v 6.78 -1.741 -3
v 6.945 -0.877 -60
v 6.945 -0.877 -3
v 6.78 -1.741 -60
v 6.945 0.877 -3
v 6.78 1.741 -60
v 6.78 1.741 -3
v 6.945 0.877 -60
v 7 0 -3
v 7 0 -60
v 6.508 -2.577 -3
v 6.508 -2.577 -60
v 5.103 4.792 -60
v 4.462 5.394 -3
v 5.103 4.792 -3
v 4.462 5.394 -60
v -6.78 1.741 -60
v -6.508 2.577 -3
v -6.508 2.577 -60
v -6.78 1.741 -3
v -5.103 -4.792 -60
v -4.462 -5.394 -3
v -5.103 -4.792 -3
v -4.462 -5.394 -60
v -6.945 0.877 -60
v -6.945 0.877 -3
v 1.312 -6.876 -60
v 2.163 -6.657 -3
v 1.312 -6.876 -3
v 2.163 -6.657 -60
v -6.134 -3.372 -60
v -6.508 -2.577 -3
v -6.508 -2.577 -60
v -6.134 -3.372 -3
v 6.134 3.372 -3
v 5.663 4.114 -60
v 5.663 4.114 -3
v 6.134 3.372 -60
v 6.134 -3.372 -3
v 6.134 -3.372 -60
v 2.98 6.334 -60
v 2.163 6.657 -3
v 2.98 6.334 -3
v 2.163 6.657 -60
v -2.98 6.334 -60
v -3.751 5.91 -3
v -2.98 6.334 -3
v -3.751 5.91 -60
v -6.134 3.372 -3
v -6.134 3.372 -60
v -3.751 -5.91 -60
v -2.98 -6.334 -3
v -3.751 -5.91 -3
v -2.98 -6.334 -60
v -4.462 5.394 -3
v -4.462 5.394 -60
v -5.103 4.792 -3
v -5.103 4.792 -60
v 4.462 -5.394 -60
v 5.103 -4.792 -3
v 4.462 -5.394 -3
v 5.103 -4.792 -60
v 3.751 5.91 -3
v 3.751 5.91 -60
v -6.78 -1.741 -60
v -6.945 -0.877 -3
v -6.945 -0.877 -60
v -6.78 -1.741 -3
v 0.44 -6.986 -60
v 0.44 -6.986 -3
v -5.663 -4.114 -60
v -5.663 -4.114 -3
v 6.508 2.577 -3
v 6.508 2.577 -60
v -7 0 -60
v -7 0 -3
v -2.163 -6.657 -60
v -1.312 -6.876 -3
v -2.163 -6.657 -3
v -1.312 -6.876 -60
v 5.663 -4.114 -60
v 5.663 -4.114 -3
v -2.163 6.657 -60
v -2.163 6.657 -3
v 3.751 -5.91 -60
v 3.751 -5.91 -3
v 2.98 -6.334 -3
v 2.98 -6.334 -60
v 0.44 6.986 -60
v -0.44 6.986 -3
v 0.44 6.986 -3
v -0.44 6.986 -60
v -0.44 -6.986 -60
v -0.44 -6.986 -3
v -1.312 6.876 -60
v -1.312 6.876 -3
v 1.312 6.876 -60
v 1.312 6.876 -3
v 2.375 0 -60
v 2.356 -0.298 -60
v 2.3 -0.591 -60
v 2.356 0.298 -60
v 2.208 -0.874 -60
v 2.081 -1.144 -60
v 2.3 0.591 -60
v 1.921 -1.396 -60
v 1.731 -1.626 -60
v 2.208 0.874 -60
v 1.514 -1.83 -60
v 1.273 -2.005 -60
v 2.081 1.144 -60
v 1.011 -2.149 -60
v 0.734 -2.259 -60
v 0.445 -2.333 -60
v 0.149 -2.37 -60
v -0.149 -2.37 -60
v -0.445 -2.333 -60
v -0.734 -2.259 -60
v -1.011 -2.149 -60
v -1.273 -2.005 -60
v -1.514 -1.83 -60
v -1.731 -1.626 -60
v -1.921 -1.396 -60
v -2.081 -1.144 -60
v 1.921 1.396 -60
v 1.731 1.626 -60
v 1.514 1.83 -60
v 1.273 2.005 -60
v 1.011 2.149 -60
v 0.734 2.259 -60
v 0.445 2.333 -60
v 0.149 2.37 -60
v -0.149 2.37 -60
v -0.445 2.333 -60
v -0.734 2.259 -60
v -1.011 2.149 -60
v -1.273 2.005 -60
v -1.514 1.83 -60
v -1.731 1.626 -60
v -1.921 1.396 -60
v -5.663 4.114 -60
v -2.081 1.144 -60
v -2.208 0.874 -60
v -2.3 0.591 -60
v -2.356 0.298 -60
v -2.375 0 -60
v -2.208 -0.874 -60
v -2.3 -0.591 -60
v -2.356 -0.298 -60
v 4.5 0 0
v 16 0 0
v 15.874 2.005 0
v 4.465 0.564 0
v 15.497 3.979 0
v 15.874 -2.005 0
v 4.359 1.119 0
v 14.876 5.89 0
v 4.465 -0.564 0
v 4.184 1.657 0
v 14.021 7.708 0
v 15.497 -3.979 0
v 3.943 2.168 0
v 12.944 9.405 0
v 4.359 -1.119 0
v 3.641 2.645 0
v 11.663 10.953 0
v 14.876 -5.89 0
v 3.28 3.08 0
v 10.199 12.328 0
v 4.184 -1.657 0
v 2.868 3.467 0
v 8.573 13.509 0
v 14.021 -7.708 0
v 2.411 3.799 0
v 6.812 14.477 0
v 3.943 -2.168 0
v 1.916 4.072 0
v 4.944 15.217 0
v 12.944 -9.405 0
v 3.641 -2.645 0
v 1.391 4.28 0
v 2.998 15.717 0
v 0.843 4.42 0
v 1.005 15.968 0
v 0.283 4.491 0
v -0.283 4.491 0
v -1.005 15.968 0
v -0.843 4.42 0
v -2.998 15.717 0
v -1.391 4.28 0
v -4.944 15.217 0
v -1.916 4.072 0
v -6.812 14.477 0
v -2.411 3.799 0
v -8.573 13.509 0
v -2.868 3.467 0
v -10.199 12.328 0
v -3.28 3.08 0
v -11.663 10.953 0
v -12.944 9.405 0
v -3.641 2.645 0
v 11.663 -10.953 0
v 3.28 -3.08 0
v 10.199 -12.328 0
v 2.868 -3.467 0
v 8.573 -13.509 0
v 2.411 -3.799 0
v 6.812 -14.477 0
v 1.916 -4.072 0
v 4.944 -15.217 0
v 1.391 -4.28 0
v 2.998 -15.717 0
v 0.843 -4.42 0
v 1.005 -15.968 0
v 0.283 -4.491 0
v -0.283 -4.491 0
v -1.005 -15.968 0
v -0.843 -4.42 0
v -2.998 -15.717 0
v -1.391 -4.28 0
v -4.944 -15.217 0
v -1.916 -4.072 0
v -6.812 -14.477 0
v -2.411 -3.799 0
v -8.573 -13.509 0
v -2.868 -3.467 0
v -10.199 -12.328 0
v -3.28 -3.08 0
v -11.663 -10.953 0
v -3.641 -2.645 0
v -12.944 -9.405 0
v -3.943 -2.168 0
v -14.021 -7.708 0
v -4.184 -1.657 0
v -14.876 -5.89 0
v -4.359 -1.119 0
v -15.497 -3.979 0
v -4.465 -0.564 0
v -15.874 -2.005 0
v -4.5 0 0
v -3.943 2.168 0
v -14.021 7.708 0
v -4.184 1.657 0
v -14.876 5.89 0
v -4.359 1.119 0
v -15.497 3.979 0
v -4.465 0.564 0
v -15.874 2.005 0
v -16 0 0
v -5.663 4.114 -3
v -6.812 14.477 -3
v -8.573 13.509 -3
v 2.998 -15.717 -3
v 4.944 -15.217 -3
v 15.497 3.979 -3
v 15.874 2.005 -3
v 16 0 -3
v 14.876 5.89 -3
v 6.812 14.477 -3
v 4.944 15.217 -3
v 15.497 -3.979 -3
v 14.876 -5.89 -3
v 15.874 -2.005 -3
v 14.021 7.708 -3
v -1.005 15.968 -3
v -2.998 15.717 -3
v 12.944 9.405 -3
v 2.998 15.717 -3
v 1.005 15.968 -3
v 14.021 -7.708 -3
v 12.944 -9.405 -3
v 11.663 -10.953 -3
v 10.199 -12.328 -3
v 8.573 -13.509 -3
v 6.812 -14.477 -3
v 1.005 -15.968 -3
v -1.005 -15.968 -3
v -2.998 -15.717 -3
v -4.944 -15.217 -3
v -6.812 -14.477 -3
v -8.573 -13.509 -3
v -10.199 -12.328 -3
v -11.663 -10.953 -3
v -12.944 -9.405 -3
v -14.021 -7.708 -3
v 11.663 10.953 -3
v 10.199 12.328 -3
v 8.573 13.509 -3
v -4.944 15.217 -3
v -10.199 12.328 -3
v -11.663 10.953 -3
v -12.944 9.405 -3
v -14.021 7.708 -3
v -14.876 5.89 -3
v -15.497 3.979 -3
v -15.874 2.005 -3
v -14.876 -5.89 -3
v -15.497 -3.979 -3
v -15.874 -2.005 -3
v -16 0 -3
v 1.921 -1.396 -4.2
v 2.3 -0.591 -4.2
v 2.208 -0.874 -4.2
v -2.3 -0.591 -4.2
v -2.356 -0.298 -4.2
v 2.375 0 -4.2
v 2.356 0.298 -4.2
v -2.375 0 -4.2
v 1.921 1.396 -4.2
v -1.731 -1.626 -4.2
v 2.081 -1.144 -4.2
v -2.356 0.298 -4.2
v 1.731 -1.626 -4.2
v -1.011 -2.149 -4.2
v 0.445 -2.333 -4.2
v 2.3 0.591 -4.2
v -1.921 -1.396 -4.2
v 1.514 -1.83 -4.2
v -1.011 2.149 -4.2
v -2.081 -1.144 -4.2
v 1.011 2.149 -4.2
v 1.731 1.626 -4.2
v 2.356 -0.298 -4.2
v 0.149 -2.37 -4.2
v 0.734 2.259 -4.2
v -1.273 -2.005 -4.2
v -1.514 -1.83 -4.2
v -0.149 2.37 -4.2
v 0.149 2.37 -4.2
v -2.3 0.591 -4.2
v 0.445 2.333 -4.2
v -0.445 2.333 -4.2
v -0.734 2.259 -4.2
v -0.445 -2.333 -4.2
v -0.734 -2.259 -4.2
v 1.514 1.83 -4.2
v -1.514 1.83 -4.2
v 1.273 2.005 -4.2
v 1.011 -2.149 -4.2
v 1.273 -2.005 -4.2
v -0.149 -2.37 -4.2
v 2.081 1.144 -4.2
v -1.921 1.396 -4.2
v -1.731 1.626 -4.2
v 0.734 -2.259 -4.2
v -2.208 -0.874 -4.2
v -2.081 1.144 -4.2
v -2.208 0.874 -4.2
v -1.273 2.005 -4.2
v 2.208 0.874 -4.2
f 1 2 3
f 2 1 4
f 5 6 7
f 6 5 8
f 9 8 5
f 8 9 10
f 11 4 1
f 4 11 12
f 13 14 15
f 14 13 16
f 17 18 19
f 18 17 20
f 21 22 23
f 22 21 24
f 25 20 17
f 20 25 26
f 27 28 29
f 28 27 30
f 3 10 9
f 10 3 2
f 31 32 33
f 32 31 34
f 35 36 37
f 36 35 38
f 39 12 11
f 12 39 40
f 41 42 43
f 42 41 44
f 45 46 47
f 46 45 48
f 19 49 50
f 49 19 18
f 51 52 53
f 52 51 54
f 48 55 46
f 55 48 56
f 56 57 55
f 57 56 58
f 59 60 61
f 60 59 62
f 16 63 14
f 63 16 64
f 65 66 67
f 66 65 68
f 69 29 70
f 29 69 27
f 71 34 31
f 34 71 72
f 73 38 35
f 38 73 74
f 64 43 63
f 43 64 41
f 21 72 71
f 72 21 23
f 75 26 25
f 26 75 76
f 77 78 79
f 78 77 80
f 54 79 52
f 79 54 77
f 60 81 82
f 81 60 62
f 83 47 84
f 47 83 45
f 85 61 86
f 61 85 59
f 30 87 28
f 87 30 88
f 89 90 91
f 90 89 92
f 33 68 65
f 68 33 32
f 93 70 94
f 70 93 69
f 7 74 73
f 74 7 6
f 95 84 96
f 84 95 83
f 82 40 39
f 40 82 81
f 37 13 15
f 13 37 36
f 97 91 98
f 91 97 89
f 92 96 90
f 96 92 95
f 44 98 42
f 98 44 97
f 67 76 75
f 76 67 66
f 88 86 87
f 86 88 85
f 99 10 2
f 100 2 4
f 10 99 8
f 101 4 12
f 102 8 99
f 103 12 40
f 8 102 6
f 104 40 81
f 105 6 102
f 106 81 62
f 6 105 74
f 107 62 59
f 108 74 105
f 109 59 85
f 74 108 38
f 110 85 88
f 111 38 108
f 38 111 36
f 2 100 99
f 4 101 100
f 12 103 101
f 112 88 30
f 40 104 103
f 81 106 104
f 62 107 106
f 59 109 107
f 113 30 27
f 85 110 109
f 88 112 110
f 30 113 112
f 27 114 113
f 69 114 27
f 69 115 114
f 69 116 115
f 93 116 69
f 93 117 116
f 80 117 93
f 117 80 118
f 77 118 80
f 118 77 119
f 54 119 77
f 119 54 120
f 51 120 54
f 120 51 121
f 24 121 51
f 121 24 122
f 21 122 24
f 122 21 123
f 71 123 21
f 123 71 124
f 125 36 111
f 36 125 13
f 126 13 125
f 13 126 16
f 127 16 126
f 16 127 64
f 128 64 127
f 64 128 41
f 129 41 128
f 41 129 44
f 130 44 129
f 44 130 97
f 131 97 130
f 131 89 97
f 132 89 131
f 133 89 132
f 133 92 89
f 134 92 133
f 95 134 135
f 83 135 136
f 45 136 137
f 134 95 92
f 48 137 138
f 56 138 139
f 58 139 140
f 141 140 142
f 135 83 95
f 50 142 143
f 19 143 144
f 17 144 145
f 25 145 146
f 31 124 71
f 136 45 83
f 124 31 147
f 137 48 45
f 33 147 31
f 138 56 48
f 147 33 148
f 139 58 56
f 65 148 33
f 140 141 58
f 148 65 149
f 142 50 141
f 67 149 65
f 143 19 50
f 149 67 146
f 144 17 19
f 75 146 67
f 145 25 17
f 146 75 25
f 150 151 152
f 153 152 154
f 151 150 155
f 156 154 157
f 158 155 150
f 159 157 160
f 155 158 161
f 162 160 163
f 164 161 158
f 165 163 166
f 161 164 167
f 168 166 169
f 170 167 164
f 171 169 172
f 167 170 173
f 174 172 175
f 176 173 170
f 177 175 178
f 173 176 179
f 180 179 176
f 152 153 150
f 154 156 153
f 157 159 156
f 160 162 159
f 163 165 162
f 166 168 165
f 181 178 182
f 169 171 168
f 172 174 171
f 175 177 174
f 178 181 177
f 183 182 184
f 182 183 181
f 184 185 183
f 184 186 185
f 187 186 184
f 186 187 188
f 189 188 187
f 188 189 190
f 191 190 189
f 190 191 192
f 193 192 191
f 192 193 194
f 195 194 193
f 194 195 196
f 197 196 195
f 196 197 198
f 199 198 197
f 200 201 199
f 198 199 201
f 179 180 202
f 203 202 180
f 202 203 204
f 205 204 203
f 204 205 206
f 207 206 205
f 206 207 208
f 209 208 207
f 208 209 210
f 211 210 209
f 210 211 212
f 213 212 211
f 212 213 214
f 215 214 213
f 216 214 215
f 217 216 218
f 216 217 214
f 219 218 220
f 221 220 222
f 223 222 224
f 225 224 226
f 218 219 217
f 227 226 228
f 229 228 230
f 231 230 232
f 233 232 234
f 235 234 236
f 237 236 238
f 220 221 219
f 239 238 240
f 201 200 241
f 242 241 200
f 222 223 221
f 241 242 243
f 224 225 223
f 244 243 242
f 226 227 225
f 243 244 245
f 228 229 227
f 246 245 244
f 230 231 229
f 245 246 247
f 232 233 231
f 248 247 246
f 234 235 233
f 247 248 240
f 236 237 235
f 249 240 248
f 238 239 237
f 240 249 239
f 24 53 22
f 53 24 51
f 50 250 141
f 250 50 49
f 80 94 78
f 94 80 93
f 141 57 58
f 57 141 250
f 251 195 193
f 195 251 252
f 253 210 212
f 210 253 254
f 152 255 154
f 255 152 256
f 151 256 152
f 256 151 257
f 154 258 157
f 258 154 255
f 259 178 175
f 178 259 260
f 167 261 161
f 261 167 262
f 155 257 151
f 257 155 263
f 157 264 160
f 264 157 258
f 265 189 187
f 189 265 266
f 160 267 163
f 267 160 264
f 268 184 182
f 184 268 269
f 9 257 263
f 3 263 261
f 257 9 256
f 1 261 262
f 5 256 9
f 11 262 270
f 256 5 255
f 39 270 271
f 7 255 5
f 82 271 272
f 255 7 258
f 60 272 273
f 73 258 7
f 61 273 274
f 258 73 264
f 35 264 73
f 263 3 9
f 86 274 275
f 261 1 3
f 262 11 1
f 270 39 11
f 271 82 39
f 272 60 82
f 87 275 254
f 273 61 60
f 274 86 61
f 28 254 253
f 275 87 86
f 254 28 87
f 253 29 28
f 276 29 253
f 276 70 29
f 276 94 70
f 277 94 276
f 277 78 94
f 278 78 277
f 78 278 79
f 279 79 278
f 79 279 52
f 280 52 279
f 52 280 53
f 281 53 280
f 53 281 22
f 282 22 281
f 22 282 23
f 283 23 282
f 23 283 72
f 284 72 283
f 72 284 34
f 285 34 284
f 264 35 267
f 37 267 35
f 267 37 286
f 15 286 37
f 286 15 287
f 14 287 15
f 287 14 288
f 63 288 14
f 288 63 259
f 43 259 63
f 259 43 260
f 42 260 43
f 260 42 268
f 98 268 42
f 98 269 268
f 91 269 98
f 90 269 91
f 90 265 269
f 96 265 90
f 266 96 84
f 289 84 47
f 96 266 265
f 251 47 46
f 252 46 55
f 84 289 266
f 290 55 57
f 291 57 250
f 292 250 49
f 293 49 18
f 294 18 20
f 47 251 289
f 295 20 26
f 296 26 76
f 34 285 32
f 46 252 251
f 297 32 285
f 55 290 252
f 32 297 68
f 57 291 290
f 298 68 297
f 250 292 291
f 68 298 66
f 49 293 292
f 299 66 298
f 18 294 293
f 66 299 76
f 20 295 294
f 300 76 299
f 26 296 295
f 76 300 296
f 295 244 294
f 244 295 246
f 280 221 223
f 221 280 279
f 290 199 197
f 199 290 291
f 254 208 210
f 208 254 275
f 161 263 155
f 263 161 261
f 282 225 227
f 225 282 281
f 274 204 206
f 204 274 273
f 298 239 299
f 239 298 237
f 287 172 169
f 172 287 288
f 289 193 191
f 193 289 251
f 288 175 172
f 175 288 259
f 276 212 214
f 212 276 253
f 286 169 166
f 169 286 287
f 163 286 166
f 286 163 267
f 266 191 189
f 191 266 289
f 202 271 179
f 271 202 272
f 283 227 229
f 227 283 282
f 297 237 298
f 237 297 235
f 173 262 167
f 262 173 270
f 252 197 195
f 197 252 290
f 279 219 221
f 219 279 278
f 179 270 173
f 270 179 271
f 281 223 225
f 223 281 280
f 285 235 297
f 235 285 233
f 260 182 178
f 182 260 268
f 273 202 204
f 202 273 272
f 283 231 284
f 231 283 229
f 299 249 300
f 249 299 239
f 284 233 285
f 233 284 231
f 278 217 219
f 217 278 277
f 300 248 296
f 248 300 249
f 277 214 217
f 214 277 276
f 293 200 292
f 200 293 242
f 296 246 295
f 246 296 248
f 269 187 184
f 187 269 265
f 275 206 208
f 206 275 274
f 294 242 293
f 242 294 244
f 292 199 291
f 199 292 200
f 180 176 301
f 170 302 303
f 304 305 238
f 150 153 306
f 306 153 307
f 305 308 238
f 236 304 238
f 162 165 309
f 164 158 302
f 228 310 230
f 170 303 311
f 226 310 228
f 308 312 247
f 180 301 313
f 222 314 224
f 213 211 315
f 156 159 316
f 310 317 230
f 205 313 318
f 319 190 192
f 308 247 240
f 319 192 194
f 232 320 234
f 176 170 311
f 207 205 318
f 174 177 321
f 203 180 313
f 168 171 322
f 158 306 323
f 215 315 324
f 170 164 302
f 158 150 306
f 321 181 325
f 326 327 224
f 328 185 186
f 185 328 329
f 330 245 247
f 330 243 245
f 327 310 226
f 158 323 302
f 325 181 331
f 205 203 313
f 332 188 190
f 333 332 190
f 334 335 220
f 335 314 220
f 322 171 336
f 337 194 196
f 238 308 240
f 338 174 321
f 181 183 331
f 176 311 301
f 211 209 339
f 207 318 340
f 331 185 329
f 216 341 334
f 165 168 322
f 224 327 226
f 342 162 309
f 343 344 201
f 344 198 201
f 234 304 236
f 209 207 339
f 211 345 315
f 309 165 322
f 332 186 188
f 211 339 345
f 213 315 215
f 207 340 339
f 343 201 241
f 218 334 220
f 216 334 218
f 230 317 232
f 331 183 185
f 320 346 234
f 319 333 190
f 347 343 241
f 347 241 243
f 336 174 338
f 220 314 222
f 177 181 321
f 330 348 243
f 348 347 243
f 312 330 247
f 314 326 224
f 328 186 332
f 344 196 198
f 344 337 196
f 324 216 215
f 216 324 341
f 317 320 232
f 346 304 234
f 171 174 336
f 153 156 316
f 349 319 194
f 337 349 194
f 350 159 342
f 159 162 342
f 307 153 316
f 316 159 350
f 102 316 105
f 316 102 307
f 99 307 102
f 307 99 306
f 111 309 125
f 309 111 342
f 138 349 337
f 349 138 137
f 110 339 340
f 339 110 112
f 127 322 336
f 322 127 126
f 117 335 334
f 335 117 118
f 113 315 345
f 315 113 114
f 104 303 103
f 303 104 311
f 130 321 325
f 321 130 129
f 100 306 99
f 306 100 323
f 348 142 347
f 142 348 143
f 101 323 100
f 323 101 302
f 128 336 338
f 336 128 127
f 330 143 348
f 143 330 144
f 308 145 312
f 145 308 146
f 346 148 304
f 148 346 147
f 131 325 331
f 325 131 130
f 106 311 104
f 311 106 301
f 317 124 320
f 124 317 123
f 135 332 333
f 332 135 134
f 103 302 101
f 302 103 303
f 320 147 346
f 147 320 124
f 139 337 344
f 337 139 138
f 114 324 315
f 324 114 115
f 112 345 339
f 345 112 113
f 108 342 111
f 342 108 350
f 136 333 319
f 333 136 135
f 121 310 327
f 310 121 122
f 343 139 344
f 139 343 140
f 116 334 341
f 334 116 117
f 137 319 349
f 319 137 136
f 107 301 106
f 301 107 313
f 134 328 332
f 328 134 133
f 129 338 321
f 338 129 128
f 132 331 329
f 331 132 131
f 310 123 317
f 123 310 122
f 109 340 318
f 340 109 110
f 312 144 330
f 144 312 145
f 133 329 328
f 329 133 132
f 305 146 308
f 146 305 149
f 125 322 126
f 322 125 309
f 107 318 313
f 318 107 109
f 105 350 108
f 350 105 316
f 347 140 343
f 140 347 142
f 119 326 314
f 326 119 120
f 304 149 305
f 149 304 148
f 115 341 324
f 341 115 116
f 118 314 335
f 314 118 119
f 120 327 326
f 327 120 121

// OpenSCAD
$fn = 50;


difference() {
	union() {
		translate(v = [0, 0, -60.0000000000]) {
			cylinder(h = 60, r = 7.0000000000);
		}
		translate(v = [0, 0, -3.0000000000]) {
			cylinder(h = 3, r = 16.0000000000);
		}
	}
	union() {
		translate(v = [0, 0, 0]) {
			rotate(a = [0, 0, 0]) {
				difference() {
					union() {
						#translate(v = [0, 0, -60.0000000000]) {
							cylinder(h = 60, r = 2.2500000000);
						}
						#translate(v = [0, 0, -4.2000000000]) {
							cylinder(h = 4.2000000000, r = 7.0000000000, r1 = 2.3750000000, r2 = 4.5000000000);
						}
						#translate(v = [0, 0, -60.0000000000]) {
							cylinder(h = 60, r = 2.3750000000);
						}
						#translate(v = [0, 0, -60.0000000000]) {
							cylinder(h = 60, r = 2.2500000000);
						}
					}
					union();
				}
			}
		}
	}
}
